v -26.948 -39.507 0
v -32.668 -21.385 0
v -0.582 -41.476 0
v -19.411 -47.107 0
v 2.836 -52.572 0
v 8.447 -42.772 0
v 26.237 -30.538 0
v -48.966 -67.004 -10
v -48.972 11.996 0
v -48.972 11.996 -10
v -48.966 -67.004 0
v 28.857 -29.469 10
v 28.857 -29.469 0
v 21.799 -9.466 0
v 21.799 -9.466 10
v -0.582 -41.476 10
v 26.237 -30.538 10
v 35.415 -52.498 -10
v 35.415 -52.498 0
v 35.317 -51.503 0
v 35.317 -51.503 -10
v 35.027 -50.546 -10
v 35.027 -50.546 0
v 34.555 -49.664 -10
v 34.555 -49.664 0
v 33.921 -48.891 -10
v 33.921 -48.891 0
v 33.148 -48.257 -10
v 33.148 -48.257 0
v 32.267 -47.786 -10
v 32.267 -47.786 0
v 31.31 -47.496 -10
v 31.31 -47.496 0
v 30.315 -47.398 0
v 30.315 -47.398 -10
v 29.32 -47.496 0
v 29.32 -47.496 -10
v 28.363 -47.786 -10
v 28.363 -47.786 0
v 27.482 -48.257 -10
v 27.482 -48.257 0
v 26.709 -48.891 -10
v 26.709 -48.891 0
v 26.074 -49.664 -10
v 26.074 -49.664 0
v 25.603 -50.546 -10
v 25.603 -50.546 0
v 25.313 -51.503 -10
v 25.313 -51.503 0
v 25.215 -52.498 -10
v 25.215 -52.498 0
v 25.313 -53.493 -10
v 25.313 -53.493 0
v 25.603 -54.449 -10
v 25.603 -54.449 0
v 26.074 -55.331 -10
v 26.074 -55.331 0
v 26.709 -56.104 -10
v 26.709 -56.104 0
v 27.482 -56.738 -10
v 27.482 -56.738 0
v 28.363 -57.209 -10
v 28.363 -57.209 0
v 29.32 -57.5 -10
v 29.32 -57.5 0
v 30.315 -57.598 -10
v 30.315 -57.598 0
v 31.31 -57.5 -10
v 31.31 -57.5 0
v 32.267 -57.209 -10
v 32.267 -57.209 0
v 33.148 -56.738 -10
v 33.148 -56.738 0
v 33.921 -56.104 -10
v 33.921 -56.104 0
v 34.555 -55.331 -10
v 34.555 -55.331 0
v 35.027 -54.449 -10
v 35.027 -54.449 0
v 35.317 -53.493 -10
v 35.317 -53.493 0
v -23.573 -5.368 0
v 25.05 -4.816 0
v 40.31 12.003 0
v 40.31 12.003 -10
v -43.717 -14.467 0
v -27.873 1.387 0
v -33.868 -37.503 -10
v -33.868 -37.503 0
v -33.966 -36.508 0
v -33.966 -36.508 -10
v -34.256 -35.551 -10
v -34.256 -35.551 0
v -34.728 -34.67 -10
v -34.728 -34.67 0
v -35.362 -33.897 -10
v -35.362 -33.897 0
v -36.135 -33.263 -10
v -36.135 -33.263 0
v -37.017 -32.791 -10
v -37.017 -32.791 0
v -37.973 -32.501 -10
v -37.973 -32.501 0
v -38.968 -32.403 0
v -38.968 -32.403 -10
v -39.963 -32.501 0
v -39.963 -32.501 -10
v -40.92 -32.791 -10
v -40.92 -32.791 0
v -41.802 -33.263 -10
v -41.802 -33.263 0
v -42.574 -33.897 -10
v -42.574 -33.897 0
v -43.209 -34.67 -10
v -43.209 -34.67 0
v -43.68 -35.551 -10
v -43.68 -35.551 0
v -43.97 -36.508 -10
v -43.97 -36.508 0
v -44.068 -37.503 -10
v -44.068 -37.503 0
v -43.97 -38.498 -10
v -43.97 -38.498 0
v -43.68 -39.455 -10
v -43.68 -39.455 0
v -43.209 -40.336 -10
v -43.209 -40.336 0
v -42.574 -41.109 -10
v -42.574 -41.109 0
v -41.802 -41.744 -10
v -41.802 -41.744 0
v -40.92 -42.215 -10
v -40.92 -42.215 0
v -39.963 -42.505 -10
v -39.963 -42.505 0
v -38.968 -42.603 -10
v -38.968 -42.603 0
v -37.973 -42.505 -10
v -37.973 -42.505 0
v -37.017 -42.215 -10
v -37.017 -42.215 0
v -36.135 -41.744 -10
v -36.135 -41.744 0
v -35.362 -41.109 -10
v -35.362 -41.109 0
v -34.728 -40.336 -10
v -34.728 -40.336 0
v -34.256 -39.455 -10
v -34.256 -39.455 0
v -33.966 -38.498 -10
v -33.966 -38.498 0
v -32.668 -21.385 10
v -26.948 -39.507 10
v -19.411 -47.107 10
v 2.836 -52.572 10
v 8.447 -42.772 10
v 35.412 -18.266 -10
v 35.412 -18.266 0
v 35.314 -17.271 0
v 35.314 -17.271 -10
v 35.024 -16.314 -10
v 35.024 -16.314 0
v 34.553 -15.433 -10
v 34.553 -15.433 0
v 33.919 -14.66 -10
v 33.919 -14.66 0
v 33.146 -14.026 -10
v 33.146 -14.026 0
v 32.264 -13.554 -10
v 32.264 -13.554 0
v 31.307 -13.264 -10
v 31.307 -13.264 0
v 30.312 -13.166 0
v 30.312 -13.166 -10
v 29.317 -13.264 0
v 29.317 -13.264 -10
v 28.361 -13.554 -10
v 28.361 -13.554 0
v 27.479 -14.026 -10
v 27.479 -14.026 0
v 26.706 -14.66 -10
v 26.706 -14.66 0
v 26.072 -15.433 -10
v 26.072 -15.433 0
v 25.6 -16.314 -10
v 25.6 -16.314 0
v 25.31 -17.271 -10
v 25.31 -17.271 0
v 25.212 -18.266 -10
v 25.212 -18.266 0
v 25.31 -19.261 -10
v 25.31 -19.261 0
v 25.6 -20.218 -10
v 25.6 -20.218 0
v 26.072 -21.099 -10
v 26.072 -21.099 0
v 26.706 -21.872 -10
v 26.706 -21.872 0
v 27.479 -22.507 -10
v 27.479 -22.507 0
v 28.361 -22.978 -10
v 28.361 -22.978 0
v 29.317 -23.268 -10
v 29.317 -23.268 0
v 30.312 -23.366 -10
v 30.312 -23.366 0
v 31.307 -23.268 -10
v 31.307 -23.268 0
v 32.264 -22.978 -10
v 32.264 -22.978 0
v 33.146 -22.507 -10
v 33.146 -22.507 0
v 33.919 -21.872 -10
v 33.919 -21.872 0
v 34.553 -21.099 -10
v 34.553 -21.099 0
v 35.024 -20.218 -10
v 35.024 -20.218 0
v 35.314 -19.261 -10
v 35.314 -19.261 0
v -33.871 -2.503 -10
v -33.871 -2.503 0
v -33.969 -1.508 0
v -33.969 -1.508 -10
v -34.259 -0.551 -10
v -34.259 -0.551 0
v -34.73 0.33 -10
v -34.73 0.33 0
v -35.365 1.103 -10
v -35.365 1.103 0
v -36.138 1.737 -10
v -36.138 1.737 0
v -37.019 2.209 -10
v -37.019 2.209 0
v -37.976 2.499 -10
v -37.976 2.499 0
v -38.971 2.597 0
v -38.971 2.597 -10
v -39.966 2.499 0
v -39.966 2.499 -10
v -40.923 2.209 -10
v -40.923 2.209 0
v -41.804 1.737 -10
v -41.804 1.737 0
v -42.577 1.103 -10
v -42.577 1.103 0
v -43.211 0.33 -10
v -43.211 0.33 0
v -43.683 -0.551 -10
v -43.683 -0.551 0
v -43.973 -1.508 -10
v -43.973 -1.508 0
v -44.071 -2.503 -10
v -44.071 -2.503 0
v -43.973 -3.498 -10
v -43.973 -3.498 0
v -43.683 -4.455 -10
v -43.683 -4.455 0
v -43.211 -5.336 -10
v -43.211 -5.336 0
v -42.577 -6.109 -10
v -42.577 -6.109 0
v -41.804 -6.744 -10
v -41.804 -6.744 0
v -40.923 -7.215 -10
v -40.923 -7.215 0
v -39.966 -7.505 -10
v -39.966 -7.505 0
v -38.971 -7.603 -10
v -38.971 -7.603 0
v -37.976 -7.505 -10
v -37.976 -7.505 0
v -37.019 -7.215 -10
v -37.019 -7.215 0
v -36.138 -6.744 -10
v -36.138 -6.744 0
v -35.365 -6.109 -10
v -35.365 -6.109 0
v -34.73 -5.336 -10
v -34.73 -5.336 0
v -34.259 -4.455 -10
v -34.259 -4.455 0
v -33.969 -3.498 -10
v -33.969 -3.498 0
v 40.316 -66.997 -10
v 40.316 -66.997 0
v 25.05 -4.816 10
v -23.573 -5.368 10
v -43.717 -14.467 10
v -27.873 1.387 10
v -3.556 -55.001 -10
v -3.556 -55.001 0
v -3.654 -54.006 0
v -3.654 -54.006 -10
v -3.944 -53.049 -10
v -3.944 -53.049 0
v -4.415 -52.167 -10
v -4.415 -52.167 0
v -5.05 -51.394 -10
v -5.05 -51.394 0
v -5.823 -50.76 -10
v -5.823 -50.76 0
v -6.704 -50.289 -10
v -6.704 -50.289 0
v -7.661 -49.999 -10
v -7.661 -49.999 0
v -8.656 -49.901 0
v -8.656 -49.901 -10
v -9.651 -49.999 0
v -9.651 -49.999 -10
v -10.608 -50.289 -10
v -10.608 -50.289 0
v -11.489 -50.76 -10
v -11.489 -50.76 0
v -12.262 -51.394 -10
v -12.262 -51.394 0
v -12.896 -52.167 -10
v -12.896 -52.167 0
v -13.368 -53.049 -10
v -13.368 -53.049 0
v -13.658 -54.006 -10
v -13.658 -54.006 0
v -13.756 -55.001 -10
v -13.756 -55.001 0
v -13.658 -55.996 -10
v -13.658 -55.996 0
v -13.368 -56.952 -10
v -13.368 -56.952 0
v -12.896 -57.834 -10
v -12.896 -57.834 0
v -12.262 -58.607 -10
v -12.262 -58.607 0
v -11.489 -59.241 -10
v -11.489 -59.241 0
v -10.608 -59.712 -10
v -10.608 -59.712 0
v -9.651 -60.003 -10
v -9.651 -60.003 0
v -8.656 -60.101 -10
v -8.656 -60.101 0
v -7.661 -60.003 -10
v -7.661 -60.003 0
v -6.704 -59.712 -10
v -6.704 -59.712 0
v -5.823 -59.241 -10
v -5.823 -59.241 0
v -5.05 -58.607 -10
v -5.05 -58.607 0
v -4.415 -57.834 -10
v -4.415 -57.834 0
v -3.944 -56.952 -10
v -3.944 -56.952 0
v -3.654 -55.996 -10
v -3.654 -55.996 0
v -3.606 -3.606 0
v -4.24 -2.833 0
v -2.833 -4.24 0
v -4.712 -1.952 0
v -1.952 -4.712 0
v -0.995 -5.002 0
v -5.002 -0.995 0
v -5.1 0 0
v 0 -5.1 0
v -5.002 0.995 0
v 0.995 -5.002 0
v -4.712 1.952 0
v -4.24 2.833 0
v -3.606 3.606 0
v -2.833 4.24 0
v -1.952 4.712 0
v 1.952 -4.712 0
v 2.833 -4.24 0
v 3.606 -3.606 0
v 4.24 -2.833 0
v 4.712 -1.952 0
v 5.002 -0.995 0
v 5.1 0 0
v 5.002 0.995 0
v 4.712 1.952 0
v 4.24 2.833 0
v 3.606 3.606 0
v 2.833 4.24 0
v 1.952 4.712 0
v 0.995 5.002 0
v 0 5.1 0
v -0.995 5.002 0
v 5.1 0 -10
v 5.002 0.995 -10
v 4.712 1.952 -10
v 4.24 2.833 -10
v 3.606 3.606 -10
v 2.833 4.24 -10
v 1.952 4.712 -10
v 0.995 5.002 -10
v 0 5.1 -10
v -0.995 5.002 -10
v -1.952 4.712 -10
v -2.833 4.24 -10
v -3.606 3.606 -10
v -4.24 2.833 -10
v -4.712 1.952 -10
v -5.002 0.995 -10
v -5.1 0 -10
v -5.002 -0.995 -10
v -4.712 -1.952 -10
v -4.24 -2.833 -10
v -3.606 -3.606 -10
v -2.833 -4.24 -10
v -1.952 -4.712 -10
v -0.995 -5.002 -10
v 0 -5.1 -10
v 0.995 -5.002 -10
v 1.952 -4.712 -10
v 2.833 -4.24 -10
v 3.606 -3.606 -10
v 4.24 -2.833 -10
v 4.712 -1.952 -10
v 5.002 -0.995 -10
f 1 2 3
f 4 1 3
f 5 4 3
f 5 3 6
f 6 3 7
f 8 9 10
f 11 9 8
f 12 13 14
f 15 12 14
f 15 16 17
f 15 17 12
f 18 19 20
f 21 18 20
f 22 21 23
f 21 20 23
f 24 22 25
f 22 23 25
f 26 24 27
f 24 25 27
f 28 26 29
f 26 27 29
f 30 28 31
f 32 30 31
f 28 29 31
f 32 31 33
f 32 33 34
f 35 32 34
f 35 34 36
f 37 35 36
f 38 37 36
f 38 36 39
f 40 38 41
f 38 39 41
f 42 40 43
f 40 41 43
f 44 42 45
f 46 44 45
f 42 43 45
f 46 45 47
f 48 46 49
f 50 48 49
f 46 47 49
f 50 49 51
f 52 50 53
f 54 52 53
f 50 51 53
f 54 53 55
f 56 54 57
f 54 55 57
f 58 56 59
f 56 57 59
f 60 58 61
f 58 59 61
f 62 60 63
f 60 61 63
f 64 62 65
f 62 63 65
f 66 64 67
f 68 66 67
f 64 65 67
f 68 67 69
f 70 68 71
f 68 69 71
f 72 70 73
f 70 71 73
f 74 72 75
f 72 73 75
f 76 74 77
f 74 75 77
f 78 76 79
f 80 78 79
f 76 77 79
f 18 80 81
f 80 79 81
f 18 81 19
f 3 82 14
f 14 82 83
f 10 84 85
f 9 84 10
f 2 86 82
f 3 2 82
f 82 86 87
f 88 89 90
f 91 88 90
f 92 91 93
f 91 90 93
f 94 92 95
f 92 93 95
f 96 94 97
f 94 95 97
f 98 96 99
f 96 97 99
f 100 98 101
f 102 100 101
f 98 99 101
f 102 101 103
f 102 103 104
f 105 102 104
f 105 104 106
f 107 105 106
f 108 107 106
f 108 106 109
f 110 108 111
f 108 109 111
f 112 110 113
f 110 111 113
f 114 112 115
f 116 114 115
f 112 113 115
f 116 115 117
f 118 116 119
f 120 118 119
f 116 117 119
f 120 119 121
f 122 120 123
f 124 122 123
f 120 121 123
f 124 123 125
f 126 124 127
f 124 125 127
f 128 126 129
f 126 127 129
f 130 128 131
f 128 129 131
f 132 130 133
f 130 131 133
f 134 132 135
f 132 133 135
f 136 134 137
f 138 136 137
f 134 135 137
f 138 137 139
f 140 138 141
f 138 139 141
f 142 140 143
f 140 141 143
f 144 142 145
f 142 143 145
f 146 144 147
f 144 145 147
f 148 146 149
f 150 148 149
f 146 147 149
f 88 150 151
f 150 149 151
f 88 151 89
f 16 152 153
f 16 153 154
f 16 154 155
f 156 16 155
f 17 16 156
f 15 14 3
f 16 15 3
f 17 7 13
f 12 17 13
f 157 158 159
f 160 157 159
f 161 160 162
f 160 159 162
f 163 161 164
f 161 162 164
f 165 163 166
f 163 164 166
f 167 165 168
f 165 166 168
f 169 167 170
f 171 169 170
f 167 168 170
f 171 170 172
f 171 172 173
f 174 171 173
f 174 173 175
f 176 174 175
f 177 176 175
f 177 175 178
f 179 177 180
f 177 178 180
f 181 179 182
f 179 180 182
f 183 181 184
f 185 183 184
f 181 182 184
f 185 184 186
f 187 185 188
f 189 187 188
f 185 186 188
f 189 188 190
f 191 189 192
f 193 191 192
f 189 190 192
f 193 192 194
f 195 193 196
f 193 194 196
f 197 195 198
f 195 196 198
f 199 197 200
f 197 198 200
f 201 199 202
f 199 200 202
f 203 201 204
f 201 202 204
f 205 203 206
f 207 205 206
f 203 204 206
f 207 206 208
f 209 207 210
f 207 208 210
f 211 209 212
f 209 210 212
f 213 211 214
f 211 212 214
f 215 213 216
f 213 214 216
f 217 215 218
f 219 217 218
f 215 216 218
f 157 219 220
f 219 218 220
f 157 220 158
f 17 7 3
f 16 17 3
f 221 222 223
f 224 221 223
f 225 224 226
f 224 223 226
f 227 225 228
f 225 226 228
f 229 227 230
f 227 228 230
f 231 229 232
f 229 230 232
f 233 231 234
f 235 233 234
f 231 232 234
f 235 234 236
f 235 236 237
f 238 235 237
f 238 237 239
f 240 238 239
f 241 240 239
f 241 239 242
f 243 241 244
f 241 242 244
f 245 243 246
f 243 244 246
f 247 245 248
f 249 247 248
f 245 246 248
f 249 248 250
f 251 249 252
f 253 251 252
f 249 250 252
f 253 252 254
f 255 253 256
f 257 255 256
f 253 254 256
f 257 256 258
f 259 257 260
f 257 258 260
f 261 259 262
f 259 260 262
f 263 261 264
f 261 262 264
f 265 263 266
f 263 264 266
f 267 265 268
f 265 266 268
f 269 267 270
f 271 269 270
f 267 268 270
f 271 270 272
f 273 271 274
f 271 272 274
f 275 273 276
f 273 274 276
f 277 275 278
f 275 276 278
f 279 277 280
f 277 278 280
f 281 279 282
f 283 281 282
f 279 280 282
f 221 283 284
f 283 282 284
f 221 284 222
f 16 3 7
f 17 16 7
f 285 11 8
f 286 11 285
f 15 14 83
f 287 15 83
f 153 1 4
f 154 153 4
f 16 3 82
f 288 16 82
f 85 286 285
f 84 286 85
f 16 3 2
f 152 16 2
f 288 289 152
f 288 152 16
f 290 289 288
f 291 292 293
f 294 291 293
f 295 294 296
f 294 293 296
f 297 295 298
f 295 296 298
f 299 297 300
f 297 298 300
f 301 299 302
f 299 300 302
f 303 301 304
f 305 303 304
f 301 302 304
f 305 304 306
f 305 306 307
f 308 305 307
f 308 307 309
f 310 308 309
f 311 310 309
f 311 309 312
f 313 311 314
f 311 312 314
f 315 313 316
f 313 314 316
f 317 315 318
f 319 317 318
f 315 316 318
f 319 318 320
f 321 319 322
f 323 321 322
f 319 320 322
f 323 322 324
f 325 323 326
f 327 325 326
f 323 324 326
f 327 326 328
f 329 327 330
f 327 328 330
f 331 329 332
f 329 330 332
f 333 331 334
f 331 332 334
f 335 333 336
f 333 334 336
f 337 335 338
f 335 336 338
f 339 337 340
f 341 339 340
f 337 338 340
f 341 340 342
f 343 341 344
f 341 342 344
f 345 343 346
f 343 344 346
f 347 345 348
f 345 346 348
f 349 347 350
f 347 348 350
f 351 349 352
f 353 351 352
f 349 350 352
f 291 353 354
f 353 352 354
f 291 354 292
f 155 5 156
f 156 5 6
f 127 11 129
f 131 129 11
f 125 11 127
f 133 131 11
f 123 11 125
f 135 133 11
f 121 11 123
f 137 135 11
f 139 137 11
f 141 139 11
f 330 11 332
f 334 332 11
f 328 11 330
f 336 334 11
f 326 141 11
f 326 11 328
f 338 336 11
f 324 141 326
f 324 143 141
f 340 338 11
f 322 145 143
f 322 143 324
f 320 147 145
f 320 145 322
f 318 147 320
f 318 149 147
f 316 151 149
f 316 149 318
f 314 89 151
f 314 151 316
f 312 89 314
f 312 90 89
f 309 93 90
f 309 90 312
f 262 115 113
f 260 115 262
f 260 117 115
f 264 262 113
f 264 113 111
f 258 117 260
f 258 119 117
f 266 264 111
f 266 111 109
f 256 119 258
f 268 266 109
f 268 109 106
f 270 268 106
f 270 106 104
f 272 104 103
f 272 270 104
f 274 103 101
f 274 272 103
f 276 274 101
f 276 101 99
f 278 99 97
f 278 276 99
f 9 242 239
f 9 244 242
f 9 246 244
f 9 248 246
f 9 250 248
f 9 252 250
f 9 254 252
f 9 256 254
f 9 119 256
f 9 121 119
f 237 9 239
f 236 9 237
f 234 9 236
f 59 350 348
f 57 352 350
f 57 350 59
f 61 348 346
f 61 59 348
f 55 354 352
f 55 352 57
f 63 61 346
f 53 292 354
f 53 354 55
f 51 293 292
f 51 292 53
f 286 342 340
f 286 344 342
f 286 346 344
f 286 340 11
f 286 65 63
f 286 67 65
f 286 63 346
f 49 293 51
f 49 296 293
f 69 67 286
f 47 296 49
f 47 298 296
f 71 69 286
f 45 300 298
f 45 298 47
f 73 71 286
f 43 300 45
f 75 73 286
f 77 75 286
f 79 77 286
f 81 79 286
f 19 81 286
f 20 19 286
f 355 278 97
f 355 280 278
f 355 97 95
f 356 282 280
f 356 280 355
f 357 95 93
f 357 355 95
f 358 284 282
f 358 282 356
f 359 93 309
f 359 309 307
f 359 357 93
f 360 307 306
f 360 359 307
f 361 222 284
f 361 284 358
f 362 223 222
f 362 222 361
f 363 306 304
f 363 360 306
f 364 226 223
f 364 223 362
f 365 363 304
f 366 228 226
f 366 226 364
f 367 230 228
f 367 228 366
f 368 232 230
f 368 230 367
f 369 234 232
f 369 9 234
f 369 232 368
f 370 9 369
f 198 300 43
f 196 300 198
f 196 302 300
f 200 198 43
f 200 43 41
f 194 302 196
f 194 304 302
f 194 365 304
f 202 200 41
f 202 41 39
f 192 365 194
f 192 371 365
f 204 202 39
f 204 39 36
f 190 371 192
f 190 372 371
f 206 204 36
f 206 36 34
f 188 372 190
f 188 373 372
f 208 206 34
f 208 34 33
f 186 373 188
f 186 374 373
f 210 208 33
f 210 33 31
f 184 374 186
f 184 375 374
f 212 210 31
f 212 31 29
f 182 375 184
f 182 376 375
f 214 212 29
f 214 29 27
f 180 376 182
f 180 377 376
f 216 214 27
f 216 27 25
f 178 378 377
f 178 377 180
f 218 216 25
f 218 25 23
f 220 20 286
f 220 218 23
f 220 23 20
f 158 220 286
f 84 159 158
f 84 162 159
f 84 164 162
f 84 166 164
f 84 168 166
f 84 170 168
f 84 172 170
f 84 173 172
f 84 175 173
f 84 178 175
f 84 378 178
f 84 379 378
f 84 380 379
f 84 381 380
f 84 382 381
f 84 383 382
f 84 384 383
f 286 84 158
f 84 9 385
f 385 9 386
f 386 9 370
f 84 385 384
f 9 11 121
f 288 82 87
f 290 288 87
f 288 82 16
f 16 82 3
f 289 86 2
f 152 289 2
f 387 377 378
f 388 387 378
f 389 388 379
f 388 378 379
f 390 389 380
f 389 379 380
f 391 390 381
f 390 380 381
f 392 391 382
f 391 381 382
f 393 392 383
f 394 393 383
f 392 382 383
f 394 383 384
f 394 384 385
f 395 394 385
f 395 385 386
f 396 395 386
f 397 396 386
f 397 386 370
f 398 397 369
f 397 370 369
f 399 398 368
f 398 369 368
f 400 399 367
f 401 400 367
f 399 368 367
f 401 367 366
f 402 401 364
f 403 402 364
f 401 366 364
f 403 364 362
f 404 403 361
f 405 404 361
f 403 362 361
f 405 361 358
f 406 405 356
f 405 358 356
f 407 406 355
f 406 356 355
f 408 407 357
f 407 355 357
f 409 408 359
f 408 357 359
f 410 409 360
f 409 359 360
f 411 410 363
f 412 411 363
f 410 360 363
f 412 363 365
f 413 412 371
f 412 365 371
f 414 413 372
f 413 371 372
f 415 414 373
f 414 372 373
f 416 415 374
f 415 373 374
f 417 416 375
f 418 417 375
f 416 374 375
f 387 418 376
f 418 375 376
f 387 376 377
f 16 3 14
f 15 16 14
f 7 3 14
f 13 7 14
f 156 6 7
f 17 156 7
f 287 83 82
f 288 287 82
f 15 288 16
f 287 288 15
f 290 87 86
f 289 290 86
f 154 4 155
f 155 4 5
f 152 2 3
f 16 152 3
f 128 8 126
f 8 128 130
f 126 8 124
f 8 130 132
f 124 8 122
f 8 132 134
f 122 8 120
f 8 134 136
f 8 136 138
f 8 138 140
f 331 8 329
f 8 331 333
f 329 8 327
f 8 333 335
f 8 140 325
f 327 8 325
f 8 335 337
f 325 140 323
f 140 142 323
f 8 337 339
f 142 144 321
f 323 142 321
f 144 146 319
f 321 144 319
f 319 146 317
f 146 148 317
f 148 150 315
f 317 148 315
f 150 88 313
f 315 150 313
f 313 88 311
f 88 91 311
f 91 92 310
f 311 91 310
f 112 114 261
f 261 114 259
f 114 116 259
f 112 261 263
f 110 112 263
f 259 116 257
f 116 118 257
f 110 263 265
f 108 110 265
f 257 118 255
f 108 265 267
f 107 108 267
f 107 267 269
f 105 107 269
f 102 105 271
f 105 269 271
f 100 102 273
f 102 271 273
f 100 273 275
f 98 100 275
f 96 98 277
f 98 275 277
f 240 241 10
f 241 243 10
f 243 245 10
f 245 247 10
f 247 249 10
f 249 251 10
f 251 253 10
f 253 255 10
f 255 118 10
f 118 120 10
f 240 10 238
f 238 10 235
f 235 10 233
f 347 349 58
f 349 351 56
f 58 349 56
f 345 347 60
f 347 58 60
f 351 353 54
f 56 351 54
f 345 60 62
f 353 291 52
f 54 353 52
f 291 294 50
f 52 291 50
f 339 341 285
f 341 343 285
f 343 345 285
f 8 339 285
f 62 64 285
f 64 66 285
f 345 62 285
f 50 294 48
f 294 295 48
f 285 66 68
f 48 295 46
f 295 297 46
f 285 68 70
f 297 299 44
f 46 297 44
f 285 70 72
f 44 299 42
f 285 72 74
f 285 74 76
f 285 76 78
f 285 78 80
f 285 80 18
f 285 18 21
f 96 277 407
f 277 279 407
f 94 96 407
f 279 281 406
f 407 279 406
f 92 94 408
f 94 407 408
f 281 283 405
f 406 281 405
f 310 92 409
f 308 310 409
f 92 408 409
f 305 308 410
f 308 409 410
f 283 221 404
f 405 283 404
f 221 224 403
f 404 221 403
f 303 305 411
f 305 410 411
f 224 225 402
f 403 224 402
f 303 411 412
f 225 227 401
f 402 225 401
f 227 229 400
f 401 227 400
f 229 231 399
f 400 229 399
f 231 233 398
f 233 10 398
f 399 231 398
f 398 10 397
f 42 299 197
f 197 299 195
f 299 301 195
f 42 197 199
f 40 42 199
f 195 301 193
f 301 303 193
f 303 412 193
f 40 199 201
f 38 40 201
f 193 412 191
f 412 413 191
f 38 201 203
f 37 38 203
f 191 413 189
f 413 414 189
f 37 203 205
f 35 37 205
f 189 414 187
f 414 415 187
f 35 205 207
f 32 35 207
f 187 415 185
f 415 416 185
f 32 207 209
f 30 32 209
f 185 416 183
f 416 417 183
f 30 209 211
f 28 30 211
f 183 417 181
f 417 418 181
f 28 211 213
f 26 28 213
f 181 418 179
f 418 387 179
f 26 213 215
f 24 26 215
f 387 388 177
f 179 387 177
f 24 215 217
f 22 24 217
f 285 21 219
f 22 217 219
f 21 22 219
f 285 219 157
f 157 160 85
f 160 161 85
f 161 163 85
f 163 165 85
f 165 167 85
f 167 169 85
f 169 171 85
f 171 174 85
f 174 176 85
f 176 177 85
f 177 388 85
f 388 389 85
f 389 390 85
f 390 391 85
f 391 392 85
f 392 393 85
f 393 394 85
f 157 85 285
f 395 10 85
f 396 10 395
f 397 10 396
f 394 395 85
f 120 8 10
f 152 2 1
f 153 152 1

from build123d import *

# Parameters (mm, degrees)
SKETCH1_R      = 5.1
ADAPT_DEPTH    = 10
BASE_TRI_DEPTH = 10
TRIA_A_DEPTH   = 10
TRIA_B_DEPTH   = 10
TRIA_C_DEPTH   = 10


with BuildPart() as part:
    # Sketch1 → Adapt (new body)
    with BuildSketch(Plane.XY):
        Polygon((-48.965905952, -67.003827635), (40.316126078, -66.996848886), (40.309951027, 12.003150872), (-48.972081003, 11.996172124), align=None)
        Circle(SKETCH1_R, mode=Mode.SUBTRACT)
        with Locations((30.312256931, -18.266077562)):
            Circle(SKETCH1_R, mode=Mode.SUBTRACT)
        with Locations((30.314992713, -52.497630583)):
            Circle(SKETCH1_R, mode=Mode.SUBTRACT)
        with Locations((-8.655954925, -55.000676762)):
            Circle(SKETCH1_R, mode=Mode.SUBTRACT)
        with Locations((-38.968211856, -37.503046073)):
            Circle(SKETCH1_R, mode=Mode.SUBTRACT)
        with Locations((-38.970947638, -2.50304618)):
            Circle(SKETCH1_R, mode=Mode.SUBTRACT)
    extrude(amount=-ADAPT_DEPTH)


with BuildPart() as body_2:
    # Sketch4 → Base-Tri (new body)
    with BuildSketch(Plane.XY):
        Polygon((-26.947825639, -39.506627222), (-19.410569028, -47.106747776), (2.836271948, -52.572492472), (8.446713864, -42.772337787), (26.236702181, -30.538171837), (-0.582015344, -41.475658592), (-32.667971796, -21.385056531), align=None)
    extrude(amount=BASE_TRI_DEPTH)


with BuildPart() as body_3:
    # Sketch4<3> → Tria-A (new body)
    with BuildSketch(Plane.XY):
        Polygon((-43.716749587, -14.466871057), (-32.667971796, -21.385056531), (-0.582015344, -41.475658592), (-23.572585967, -5.367771104), (-27.873436509, 1.38693847), align=None)
    extrude(amount=TRIA_A_DEPTH)


with BuildPart() as body_4:
    # Sketch4<4> → Tria-B (new body)
    with BuildSketch(Plane.XY):
        Polygon((-23.572585967, -5.367771104), (-0.582015344, -41.475658592), (21.798844908, -9.46637083), (25.050295391, -4.816119991), align=None)
    extrude(amount=TRIA_B_DEPTH)


with BuildPart() as body_5:
    # Sketch4<5> → Tria-C (new body)
    with BuildSketch(Plane.XY):
        Polygon((-0.582015344, -41.475658592), (26.236702181, -30.538171837), (28.857404894, -29.469369751), (21.798844908, -9.46637083), align=None)
    extrude(amount=TRIA_C_DEPTH)


solid = Compound([part.part, body_2.part, body_3.part, body_4.part, body_5.part])
